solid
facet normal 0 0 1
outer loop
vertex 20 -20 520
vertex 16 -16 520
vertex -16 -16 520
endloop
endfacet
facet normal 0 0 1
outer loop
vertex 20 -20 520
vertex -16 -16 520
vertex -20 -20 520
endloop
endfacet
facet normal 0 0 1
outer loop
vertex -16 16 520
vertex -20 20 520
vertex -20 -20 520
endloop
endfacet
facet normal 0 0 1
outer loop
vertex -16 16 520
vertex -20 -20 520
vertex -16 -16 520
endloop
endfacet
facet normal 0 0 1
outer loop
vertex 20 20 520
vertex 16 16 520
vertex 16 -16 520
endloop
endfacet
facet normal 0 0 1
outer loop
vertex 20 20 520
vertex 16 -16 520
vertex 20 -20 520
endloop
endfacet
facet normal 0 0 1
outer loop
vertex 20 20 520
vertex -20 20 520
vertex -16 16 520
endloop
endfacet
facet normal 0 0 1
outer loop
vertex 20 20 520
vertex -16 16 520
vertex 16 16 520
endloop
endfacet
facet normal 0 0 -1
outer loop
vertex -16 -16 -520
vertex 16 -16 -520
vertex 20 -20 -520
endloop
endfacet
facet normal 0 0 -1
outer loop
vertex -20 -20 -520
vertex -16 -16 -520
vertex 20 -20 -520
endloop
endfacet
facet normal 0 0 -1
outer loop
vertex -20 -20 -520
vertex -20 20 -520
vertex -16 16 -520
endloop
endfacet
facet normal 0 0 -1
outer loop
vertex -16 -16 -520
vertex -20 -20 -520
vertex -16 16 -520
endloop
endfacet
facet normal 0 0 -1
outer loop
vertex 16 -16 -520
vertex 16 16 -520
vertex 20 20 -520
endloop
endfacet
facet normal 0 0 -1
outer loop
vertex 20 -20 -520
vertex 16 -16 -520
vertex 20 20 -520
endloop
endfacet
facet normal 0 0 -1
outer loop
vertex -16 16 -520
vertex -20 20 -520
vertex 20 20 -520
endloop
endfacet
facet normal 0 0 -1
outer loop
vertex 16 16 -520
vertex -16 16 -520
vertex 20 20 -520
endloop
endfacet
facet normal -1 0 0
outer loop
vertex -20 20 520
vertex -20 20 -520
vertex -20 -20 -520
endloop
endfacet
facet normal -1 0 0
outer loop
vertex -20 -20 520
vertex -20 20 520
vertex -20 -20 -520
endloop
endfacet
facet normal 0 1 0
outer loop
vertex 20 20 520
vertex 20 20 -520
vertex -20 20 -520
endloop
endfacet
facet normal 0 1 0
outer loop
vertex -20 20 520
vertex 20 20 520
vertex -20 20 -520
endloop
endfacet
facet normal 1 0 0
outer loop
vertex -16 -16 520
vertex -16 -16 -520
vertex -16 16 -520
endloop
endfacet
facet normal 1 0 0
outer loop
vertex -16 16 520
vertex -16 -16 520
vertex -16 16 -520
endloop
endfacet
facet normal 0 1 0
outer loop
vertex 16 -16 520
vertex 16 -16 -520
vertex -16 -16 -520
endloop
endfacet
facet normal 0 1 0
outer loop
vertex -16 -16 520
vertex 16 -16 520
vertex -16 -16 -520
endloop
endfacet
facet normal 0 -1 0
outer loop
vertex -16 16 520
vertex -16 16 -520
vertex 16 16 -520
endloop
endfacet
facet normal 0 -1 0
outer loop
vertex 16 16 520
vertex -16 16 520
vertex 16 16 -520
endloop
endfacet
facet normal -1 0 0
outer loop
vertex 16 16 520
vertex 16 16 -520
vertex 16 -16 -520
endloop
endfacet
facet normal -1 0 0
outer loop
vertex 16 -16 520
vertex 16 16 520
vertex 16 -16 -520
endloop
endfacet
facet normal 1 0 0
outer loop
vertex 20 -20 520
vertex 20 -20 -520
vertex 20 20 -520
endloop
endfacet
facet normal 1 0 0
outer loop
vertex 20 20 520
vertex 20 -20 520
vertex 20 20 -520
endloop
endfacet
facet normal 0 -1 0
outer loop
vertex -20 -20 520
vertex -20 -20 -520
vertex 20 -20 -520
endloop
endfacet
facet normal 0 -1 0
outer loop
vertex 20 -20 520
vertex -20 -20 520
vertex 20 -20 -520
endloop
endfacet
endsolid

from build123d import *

# Parameters (mm, degrees)
SKETCH1_W   = 40
SKETCH1_H   = 40
SKETCH1_W_2 = 32
SKETCH1_H_2 = 32


with BuildPart() as part:
    # Sweep1: sweep along a curve in space
    with BuildLine() as sweep1_path:
        add(Edge.make_bspline(
            [(0, 0, -520), (0, 0, 520)],
            knots=[0, 0, 1, 1], degree=1))
    # Sketch1 → Sweep1 (sweep)
    with BuildSketch(Plane.XY):
        Rectangle(SKETCH1_W, SKETCH1_H)
        Rectangle(SKETCH1_W_2, SKETCH1_H_2, mode=Mode.SUBTRACT)
    sweep(path=sweep1_path.line)


solid = part.part
